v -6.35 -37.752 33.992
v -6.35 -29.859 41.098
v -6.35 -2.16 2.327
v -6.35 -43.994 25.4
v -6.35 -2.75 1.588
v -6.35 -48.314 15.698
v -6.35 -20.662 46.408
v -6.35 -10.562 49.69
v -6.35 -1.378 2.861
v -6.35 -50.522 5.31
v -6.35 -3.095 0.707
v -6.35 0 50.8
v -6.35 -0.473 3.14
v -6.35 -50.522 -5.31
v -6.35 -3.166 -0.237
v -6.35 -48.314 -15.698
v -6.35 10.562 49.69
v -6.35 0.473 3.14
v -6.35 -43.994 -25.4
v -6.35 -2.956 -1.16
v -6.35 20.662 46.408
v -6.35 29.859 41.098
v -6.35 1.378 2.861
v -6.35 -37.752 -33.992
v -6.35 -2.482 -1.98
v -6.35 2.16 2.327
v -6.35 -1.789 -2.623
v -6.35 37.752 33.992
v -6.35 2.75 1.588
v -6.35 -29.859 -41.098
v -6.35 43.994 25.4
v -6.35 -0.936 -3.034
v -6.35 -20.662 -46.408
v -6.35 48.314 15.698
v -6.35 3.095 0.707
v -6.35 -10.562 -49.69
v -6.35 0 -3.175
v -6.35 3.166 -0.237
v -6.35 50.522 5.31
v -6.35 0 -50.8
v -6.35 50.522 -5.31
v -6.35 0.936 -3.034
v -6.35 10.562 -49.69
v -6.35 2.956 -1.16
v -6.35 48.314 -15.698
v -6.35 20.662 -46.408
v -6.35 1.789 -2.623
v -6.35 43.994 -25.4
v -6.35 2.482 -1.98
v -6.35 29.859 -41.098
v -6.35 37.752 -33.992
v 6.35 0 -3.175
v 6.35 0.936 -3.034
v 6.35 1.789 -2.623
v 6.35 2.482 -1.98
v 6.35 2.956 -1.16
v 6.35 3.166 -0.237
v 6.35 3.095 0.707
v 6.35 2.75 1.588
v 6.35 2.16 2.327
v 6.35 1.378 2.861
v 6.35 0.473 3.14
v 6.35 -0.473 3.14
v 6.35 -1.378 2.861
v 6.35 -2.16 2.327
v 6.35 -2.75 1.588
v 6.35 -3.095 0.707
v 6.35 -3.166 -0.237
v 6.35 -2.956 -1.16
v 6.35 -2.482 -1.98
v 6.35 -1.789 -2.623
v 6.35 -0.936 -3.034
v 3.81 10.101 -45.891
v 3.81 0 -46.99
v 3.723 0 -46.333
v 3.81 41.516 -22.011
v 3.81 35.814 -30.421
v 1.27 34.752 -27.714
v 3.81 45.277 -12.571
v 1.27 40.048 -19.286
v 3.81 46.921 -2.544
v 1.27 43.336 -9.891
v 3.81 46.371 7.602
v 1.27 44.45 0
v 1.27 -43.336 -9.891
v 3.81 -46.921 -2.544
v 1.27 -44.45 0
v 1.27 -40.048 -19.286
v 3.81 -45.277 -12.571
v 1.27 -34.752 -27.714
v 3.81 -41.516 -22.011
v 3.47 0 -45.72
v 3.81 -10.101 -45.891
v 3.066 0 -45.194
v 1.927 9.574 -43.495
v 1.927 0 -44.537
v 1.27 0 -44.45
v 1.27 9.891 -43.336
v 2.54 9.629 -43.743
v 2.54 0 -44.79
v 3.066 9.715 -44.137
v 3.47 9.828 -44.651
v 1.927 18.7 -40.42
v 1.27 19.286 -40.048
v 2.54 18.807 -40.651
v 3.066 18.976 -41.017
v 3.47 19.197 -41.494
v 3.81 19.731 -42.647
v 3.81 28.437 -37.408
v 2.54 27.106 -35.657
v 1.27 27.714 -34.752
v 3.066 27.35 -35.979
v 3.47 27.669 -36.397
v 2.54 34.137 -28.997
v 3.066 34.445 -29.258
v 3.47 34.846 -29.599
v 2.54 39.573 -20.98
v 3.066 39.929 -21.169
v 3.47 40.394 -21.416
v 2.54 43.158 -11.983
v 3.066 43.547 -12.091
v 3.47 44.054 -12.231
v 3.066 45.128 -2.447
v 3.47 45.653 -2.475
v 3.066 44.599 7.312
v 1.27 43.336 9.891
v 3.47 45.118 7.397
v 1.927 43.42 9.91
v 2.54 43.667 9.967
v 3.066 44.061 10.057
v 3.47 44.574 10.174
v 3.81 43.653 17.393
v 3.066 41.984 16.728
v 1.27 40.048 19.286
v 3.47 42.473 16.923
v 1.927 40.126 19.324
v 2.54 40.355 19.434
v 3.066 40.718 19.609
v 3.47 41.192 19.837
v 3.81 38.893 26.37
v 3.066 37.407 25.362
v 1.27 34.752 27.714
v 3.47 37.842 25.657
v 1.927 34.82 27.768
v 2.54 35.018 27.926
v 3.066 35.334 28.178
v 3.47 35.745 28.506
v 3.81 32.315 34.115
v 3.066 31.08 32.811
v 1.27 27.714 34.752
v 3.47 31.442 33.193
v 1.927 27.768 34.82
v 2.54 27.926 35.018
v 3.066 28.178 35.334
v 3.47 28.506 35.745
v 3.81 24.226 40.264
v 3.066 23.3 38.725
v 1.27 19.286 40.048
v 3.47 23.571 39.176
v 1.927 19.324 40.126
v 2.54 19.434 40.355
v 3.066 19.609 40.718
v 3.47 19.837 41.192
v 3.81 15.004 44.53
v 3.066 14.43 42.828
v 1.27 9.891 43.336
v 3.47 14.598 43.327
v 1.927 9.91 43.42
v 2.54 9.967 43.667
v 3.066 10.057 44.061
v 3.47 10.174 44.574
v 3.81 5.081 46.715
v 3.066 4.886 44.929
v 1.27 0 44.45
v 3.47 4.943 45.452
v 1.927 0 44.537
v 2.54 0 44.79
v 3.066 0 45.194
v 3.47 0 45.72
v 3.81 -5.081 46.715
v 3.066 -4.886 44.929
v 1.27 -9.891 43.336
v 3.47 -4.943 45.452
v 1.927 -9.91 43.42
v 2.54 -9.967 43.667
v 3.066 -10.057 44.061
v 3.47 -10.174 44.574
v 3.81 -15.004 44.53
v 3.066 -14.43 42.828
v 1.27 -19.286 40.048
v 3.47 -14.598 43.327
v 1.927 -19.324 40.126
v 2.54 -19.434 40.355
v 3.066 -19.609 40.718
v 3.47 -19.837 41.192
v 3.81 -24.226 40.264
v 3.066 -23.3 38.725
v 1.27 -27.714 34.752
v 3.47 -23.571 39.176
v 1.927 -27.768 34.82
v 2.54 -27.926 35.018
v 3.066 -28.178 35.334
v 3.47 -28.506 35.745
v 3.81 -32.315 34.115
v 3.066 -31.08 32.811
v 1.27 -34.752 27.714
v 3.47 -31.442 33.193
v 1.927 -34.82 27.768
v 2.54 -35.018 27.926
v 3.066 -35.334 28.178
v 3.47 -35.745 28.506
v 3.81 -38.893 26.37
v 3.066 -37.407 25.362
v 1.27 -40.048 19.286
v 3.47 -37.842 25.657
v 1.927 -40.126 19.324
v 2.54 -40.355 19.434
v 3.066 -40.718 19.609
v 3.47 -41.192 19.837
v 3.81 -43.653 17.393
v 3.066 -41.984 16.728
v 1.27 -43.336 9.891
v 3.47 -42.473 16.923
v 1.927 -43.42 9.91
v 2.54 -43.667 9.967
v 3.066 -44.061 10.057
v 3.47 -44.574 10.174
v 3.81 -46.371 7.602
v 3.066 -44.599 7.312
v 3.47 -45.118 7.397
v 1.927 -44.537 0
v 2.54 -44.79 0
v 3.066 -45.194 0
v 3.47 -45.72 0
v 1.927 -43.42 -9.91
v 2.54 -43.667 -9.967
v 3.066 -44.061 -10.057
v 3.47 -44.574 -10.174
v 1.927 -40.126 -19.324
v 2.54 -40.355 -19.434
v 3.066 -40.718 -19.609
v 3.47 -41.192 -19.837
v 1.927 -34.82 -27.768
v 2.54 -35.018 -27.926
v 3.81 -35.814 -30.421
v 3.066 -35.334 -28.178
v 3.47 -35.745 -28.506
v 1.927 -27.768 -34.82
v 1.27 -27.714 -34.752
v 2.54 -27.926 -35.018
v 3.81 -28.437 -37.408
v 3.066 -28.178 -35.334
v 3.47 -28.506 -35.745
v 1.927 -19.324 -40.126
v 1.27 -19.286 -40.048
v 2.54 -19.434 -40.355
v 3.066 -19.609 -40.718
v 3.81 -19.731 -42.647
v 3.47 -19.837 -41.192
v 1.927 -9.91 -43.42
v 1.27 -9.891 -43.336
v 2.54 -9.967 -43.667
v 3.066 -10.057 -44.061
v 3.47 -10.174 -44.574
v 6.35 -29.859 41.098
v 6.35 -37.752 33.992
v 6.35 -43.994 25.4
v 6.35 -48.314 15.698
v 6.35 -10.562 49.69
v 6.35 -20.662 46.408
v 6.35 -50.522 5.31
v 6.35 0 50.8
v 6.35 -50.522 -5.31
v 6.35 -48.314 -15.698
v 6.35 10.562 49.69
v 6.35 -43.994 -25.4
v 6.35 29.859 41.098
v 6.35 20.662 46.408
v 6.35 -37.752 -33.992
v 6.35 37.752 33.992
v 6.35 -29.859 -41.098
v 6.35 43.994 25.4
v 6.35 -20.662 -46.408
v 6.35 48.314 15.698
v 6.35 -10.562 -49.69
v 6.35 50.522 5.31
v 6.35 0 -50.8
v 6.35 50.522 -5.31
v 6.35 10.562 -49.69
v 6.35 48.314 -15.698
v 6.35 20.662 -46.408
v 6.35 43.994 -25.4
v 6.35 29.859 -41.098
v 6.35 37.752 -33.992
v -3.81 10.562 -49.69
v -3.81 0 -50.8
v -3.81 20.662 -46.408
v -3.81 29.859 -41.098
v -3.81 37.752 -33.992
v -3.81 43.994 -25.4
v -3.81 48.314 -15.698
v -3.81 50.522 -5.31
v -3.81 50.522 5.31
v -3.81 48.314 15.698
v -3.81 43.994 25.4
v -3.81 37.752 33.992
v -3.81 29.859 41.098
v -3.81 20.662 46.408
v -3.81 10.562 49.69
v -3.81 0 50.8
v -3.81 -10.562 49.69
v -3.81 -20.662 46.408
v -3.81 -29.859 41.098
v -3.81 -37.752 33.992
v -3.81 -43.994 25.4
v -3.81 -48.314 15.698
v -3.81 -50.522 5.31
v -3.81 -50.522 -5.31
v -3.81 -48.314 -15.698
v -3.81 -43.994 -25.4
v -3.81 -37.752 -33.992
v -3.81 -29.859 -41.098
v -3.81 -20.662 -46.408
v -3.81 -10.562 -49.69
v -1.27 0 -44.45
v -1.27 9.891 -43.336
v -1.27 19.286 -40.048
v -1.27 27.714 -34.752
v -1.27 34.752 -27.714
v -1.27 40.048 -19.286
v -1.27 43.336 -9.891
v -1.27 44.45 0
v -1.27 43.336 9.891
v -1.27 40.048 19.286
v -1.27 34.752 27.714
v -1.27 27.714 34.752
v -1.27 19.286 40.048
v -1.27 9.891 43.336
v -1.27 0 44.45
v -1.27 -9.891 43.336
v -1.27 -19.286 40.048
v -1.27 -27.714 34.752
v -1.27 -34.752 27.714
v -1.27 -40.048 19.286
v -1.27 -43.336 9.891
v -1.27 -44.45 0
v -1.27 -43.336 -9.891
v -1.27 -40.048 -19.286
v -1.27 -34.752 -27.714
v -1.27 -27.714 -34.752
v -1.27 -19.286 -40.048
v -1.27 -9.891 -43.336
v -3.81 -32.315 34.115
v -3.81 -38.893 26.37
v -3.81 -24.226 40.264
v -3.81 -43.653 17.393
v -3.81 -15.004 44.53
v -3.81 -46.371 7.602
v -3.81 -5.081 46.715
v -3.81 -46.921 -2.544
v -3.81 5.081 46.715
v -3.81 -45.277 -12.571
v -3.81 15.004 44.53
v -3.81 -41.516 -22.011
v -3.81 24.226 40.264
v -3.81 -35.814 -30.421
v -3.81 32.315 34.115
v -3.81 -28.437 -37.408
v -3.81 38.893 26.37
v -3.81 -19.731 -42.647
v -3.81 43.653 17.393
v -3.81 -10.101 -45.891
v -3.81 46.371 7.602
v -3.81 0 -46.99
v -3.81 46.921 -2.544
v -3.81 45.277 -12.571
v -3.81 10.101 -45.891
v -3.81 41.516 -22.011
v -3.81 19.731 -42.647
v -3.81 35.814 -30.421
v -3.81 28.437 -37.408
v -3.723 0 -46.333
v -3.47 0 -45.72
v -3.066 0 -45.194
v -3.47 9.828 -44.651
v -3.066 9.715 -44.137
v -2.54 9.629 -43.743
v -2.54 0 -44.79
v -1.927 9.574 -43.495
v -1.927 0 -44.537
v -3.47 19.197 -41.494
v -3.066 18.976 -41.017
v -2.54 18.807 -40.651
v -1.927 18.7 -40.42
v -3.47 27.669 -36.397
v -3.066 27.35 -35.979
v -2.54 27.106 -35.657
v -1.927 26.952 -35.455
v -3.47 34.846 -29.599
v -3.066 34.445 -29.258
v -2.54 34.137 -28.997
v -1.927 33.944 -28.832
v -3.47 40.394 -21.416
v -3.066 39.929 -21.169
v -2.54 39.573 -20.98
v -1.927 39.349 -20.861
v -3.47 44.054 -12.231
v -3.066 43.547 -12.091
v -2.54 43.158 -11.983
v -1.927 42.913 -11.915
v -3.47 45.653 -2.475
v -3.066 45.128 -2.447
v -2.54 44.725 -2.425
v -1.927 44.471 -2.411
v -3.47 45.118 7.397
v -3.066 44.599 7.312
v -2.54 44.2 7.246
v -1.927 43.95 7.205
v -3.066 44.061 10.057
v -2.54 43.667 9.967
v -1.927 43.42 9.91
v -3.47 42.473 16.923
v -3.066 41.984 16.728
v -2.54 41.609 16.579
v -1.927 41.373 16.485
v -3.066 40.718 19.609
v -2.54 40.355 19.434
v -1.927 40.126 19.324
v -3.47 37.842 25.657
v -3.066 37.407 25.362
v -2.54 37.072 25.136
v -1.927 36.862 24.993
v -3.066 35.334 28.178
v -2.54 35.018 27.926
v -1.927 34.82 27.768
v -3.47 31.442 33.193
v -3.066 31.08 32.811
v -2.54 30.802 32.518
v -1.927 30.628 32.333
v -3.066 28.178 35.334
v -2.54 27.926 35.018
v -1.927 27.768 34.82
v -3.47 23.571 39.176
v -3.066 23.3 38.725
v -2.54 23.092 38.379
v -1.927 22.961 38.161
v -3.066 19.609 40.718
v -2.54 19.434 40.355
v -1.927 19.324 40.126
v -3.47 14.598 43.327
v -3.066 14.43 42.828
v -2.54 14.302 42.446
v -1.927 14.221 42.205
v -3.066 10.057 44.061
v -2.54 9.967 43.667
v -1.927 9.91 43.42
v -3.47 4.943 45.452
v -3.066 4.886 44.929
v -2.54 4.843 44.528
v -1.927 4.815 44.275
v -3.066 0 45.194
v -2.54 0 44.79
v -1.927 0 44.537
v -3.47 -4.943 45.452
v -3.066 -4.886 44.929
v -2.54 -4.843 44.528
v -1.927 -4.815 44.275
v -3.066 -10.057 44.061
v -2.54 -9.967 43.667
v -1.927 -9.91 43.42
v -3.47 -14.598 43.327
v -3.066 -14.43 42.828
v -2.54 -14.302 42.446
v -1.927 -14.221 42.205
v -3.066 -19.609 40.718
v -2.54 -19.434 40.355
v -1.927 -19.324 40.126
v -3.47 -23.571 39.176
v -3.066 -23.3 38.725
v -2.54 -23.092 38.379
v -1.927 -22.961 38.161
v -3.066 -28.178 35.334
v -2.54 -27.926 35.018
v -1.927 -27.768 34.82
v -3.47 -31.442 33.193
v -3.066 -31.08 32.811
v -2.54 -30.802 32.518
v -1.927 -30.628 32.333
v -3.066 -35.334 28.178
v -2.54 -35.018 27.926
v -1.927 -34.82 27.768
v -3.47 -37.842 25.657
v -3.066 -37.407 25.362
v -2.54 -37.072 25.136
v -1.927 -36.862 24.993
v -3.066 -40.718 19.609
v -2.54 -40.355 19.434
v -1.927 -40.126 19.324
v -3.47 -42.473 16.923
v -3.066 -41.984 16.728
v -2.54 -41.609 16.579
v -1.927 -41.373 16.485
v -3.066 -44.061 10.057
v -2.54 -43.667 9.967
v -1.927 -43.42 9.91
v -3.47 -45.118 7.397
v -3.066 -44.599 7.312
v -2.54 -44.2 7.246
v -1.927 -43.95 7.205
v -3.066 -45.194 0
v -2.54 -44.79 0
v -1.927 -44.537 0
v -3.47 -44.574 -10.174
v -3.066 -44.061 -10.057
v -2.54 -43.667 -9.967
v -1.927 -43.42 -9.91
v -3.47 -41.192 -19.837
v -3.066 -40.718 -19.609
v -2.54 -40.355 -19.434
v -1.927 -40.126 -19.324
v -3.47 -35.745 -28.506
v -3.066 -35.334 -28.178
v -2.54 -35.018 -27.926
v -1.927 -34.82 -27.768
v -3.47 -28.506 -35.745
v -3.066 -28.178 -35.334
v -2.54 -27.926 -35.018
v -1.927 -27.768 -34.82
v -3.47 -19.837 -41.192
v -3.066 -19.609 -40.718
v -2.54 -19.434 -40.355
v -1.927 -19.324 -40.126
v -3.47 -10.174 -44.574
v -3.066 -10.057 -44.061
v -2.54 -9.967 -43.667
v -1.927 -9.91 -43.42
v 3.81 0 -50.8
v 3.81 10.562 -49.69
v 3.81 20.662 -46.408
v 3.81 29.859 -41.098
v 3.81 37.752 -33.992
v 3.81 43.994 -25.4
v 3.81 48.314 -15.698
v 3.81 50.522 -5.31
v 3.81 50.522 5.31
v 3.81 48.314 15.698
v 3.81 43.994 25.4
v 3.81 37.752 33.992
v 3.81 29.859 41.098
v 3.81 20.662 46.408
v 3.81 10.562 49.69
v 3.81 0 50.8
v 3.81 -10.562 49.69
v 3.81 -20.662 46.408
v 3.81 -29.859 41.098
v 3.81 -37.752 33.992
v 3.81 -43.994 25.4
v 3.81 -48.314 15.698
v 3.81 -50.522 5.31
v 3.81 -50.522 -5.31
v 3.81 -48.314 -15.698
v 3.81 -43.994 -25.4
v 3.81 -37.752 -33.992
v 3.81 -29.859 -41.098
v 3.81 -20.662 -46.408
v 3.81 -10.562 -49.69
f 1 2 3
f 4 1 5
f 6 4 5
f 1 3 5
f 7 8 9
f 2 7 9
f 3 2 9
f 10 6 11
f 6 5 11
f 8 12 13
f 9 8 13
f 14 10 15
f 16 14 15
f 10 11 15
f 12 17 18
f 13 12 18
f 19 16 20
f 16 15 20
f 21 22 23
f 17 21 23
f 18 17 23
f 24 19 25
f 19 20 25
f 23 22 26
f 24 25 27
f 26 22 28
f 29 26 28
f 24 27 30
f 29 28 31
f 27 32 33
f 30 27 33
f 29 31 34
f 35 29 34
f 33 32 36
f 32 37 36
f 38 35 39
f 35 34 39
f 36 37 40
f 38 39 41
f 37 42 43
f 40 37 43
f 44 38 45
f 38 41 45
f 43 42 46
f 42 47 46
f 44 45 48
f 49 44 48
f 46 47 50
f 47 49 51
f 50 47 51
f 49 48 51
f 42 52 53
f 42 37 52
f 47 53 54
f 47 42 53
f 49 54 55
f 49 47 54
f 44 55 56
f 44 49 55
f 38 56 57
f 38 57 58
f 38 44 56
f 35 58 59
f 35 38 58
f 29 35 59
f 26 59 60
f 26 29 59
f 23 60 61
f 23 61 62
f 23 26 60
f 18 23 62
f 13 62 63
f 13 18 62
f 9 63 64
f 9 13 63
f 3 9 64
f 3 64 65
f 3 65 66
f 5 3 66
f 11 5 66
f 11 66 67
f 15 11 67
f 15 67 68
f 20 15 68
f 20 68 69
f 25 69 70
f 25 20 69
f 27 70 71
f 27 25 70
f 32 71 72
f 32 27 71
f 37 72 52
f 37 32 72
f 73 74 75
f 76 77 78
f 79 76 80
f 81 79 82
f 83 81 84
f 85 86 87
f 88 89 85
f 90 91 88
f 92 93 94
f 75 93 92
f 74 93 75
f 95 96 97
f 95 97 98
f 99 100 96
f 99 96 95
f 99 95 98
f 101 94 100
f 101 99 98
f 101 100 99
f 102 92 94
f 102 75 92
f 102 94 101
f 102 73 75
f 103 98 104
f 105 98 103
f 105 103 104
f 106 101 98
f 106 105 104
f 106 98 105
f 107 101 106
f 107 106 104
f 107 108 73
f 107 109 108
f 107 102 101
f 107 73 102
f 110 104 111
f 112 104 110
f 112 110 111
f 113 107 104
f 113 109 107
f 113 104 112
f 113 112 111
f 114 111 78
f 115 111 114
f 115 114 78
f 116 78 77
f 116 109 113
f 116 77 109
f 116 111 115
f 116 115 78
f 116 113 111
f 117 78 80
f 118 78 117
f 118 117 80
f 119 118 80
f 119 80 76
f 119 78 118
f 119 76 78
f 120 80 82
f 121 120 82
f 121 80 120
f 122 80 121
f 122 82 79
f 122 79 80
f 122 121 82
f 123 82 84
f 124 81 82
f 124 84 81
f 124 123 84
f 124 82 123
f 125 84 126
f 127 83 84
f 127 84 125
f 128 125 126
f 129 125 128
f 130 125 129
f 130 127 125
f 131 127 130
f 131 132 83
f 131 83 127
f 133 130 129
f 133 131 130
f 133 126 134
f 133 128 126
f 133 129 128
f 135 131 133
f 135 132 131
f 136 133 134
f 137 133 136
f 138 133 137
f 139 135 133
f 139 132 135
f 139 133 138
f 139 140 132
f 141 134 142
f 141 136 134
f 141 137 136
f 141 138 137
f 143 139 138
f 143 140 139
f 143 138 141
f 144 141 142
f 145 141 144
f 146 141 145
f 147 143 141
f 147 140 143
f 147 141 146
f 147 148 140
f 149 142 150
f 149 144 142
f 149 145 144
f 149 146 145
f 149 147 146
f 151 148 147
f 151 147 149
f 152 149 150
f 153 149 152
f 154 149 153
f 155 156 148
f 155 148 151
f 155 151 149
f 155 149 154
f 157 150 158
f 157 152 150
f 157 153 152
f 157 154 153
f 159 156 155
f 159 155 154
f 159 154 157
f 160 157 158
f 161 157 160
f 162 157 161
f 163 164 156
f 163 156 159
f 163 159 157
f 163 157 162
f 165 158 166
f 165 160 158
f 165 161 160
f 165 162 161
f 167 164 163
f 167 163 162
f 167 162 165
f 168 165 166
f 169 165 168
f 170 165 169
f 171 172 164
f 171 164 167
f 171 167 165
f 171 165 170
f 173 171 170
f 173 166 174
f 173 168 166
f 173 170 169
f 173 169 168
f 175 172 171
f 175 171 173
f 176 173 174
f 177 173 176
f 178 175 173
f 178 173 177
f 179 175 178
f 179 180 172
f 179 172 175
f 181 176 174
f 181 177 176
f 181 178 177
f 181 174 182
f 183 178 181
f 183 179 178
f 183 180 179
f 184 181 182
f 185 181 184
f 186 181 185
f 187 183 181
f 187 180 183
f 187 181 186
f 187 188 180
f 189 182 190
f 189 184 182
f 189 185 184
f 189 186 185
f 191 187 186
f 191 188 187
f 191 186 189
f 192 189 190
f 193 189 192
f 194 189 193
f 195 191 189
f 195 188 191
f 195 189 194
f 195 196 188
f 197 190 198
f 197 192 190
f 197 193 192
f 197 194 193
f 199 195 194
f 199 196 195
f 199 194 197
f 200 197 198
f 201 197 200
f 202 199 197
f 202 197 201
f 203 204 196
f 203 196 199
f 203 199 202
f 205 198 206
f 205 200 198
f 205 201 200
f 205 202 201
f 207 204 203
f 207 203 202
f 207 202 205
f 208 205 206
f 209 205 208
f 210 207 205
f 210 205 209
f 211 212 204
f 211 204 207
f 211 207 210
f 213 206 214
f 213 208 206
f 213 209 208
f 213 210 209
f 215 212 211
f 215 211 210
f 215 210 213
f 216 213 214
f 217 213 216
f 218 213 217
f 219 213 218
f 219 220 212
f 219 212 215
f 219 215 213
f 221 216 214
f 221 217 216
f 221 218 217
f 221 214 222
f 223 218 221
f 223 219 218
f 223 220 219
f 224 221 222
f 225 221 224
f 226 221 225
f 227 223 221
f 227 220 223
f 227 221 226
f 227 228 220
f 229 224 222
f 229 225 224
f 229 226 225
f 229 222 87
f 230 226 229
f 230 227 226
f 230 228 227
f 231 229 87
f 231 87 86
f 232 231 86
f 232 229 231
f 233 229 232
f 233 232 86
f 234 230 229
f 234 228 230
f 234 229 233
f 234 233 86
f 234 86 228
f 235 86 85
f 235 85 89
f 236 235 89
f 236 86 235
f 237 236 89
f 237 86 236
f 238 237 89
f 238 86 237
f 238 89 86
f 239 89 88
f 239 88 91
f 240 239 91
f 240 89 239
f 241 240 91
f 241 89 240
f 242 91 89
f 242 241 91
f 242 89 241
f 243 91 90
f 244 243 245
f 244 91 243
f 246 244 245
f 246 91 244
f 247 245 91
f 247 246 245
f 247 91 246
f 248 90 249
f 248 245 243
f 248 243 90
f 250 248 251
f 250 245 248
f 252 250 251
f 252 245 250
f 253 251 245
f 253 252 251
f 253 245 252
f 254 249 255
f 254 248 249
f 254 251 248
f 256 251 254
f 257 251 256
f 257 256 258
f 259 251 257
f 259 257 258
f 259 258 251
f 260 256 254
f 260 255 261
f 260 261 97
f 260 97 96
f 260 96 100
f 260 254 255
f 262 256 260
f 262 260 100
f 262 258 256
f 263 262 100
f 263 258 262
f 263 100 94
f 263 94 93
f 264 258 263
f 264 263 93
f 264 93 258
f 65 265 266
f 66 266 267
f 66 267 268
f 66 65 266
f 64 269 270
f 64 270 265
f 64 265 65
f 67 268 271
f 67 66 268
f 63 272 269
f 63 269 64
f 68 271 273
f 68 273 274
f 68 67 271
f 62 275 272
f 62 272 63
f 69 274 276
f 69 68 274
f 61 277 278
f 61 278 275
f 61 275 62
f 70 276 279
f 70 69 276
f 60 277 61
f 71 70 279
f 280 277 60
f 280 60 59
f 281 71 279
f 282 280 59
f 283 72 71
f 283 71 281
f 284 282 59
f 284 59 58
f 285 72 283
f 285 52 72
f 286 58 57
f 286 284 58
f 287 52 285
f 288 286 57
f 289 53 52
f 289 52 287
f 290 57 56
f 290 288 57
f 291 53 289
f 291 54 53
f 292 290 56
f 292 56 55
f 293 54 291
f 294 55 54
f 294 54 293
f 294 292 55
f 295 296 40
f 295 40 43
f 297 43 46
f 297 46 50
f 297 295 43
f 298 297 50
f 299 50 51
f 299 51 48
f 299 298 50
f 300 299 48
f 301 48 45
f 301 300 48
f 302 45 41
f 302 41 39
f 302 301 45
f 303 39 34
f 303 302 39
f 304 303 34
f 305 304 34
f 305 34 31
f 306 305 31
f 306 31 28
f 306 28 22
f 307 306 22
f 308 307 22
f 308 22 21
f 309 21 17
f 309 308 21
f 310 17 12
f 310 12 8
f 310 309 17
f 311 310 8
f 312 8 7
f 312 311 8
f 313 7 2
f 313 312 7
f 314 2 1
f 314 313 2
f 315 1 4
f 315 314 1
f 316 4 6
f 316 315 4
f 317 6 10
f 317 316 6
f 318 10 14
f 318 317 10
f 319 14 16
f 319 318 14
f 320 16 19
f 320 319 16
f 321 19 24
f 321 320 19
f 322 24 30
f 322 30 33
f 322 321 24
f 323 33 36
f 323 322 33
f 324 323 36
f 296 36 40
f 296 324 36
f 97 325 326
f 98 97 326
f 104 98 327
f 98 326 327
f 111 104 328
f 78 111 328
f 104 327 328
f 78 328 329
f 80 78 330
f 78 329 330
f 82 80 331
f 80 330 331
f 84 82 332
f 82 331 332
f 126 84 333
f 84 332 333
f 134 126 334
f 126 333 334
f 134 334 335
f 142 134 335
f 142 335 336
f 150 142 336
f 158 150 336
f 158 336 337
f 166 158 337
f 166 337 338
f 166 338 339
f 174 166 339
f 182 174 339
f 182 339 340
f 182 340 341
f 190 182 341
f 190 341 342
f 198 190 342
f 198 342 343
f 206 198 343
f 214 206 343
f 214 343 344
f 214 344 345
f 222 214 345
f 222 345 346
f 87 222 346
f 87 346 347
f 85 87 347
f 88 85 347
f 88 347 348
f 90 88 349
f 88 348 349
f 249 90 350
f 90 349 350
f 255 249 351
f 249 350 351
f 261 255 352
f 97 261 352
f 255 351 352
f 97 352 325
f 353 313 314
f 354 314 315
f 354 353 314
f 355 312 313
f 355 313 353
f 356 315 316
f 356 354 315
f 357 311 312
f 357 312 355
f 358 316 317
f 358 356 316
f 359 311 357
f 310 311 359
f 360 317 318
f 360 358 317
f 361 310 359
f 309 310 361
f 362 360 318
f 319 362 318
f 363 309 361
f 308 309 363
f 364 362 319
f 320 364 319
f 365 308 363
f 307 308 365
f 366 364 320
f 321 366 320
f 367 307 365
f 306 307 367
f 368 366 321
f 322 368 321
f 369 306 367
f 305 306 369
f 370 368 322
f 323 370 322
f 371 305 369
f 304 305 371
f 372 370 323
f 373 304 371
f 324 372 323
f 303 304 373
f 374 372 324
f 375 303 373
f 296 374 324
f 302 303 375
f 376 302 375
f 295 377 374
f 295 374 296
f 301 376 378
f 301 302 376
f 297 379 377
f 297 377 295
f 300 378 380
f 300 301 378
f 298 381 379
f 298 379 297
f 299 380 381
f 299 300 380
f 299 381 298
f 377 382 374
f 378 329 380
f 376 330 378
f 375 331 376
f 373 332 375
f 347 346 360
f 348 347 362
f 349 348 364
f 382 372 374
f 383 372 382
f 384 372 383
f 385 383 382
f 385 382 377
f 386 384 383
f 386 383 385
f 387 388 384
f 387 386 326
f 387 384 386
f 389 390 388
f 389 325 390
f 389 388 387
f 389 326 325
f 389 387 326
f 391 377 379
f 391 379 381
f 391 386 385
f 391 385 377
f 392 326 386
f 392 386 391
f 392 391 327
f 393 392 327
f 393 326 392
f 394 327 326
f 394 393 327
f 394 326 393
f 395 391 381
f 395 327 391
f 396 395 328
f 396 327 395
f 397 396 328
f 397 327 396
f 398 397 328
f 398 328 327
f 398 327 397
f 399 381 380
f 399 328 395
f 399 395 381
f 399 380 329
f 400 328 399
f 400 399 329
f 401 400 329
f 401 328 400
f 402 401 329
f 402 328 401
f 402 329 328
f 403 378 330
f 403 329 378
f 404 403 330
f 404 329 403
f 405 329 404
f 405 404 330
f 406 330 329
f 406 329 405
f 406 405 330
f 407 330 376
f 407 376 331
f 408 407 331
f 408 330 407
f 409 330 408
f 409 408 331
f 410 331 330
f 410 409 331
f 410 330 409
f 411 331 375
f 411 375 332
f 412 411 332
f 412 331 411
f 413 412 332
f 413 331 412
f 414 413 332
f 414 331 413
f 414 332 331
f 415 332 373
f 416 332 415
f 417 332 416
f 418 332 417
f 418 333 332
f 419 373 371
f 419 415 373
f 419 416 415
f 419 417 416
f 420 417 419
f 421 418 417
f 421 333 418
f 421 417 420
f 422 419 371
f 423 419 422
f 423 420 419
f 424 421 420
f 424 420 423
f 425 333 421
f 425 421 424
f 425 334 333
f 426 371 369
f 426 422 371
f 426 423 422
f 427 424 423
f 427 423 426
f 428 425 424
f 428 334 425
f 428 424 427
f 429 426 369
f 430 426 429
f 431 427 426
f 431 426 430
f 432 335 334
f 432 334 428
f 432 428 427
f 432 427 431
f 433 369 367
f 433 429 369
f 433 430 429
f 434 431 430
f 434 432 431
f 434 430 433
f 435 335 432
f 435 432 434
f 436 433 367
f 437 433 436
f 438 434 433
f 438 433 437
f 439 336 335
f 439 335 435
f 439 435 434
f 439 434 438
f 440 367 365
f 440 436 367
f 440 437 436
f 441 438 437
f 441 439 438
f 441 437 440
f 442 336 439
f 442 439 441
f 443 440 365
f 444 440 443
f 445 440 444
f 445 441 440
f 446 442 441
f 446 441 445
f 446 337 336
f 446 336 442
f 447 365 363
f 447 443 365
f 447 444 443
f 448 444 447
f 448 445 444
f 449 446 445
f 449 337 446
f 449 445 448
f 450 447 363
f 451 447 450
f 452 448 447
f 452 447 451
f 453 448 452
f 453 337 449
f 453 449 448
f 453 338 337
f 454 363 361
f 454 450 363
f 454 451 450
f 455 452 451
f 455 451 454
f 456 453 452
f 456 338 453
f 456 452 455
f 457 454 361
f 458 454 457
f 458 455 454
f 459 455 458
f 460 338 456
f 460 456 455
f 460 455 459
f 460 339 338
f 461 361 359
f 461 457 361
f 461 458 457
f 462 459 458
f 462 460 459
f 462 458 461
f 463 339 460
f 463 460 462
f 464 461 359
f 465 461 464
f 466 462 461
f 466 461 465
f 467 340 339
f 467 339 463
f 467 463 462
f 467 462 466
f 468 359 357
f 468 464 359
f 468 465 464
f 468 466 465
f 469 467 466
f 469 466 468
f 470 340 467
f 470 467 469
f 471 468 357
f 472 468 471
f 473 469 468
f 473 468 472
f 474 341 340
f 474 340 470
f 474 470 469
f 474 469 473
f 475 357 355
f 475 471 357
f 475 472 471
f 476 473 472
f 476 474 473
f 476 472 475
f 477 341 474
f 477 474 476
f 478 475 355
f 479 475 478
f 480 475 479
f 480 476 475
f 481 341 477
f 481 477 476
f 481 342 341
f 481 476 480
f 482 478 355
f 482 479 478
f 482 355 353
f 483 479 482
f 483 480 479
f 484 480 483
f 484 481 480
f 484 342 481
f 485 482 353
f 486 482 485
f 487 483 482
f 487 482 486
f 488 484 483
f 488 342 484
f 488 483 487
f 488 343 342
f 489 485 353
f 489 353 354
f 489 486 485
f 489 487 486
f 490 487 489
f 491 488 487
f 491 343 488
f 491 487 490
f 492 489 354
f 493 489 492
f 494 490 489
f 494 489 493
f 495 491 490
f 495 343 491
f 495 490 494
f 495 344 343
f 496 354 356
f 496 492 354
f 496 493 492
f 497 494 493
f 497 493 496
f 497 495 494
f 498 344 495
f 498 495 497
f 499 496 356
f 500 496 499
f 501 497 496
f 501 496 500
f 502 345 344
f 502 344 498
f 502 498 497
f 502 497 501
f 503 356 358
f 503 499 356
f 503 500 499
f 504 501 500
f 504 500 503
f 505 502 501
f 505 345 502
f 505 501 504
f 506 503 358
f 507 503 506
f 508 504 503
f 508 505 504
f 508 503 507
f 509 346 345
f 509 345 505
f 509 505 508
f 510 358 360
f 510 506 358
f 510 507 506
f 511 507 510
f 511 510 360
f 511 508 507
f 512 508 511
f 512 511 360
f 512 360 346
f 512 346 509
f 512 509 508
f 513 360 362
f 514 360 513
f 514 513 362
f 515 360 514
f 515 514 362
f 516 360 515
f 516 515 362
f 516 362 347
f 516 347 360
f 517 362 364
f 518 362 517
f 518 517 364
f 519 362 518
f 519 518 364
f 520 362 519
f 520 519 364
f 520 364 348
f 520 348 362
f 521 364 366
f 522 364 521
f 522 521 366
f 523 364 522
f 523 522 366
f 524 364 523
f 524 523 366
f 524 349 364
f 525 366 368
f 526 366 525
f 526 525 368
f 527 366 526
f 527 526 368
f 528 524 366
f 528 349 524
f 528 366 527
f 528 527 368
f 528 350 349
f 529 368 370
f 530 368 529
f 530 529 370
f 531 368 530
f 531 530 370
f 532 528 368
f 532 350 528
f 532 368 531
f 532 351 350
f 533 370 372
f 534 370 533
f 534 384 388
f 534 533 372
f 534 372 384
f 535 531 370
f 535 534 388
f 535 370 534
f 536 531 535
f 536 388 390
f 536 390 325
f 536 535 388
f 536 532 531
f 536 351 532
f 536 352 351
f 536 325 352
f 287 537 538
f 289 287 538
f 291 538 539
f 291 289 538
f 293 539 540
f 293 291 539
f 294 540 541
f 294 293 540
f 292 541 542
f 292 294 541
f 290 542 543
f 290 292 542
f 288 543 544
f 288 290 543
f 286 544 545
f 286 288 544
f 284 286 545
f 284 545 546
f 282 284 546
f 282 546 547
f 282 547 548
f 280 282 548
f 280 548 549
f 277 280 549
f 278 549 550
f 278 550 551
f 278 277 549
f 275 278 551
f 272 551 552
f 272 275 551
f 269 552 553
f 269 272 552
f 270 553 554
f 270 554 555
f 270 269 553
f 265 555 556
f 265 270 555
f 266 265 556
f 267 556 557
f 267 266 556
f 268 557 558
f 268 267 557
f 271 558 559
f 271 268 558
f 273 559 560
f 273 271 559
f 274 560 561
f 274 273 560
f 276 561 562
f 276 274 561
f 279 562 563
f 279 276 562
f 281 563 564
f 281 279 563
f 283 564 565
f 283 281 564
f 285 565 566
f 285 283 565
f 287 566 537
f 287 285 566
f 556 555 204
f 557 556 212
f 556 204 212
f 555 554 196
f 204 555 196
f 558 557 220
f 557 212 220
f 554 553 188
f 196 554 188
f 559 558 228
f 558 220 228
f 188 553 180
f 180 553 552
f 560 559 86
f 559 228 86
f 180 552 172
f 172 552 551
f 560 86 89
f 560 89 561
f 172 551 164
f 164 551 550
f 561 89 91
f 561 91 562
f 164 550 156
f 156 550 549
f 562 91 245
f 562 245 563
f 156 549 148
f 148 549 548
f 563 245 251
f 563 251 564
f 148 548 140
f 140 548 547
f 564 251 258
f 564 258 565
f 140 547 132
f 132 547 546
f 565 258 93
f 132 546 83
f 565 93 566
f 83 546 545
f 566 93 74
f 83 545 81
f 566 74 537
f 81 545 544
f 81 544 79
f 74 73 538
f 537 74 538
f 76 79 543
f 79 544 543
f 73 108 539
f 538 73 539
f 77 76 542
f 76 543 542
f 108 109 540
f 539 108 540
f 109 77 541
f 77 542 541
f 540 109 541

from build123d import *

# Parameters (mm, degrees)
SKETCH1_R           = 50.8
SKETCH1_R_2         = 3.175
SKETCH1_R_3         = 44.45
BOSS_EXTRUDE1_DEPTH = 6.35
SKETCH1_3_R         = 50.8
SKETCH1_3_R_2       = 44.45
CUT_EXTRUDE1_DEPTH  = 3.81
FILLET1_R           = 2.54


with BuildPart() as part:
    # Sketch1 → Boss-Extrude1 (new, symmetric)
    # profile 1 of 2: a face of its own
    with BuildSketch(Plane(origin=(0, 0, 0), x_dir=(0, 0, -1), z_dir=(1, 0, 0))):
        Circle(SKETCH1_R)
        Circle(SKETCH1_R_2, mode=Mode.SUBTRACT)
    # profile 2 of 2: a face of its own
    with BuildSketch(Plane(origin=(0, 0, 0), x_dir=(0, 0, -1), z_dir=(1, 0, 0))):
        Circle(SKETCH1_R)
        Circle(SKETCH1_R_3, mode=Mode.SUBTRACT)
    extrude(amount=BOSS_EXTRUDE1_DEPTH, both=True)

    # Sketch1<3> → Cut-Extrude1 (cut, symmetric)
    with BuildSketch(Plane(origin=(0, 0, 0), x_dir=(0, 0, -1), z_dir=(1, 0, 0))):
        Circle(SKETCH1_3_R)
        Circle(SKETCH1_3_R_2, mode=Mode.SUBTRACT)
    extrude(amount=CUT_EXTRUDE1_DEPTH, both=True, mode=Mode.SUBTRACT)

    # Fillet1
    fillet1_edges = [part.edges().sort_by_distance(p)[0] for p in [
        (-3.81, 0, 44.45),
        (3.81, 0, 44.45),
    ]]
    fillet(fillet1_edges, radius=FILLET1_R)


solid = part.part
